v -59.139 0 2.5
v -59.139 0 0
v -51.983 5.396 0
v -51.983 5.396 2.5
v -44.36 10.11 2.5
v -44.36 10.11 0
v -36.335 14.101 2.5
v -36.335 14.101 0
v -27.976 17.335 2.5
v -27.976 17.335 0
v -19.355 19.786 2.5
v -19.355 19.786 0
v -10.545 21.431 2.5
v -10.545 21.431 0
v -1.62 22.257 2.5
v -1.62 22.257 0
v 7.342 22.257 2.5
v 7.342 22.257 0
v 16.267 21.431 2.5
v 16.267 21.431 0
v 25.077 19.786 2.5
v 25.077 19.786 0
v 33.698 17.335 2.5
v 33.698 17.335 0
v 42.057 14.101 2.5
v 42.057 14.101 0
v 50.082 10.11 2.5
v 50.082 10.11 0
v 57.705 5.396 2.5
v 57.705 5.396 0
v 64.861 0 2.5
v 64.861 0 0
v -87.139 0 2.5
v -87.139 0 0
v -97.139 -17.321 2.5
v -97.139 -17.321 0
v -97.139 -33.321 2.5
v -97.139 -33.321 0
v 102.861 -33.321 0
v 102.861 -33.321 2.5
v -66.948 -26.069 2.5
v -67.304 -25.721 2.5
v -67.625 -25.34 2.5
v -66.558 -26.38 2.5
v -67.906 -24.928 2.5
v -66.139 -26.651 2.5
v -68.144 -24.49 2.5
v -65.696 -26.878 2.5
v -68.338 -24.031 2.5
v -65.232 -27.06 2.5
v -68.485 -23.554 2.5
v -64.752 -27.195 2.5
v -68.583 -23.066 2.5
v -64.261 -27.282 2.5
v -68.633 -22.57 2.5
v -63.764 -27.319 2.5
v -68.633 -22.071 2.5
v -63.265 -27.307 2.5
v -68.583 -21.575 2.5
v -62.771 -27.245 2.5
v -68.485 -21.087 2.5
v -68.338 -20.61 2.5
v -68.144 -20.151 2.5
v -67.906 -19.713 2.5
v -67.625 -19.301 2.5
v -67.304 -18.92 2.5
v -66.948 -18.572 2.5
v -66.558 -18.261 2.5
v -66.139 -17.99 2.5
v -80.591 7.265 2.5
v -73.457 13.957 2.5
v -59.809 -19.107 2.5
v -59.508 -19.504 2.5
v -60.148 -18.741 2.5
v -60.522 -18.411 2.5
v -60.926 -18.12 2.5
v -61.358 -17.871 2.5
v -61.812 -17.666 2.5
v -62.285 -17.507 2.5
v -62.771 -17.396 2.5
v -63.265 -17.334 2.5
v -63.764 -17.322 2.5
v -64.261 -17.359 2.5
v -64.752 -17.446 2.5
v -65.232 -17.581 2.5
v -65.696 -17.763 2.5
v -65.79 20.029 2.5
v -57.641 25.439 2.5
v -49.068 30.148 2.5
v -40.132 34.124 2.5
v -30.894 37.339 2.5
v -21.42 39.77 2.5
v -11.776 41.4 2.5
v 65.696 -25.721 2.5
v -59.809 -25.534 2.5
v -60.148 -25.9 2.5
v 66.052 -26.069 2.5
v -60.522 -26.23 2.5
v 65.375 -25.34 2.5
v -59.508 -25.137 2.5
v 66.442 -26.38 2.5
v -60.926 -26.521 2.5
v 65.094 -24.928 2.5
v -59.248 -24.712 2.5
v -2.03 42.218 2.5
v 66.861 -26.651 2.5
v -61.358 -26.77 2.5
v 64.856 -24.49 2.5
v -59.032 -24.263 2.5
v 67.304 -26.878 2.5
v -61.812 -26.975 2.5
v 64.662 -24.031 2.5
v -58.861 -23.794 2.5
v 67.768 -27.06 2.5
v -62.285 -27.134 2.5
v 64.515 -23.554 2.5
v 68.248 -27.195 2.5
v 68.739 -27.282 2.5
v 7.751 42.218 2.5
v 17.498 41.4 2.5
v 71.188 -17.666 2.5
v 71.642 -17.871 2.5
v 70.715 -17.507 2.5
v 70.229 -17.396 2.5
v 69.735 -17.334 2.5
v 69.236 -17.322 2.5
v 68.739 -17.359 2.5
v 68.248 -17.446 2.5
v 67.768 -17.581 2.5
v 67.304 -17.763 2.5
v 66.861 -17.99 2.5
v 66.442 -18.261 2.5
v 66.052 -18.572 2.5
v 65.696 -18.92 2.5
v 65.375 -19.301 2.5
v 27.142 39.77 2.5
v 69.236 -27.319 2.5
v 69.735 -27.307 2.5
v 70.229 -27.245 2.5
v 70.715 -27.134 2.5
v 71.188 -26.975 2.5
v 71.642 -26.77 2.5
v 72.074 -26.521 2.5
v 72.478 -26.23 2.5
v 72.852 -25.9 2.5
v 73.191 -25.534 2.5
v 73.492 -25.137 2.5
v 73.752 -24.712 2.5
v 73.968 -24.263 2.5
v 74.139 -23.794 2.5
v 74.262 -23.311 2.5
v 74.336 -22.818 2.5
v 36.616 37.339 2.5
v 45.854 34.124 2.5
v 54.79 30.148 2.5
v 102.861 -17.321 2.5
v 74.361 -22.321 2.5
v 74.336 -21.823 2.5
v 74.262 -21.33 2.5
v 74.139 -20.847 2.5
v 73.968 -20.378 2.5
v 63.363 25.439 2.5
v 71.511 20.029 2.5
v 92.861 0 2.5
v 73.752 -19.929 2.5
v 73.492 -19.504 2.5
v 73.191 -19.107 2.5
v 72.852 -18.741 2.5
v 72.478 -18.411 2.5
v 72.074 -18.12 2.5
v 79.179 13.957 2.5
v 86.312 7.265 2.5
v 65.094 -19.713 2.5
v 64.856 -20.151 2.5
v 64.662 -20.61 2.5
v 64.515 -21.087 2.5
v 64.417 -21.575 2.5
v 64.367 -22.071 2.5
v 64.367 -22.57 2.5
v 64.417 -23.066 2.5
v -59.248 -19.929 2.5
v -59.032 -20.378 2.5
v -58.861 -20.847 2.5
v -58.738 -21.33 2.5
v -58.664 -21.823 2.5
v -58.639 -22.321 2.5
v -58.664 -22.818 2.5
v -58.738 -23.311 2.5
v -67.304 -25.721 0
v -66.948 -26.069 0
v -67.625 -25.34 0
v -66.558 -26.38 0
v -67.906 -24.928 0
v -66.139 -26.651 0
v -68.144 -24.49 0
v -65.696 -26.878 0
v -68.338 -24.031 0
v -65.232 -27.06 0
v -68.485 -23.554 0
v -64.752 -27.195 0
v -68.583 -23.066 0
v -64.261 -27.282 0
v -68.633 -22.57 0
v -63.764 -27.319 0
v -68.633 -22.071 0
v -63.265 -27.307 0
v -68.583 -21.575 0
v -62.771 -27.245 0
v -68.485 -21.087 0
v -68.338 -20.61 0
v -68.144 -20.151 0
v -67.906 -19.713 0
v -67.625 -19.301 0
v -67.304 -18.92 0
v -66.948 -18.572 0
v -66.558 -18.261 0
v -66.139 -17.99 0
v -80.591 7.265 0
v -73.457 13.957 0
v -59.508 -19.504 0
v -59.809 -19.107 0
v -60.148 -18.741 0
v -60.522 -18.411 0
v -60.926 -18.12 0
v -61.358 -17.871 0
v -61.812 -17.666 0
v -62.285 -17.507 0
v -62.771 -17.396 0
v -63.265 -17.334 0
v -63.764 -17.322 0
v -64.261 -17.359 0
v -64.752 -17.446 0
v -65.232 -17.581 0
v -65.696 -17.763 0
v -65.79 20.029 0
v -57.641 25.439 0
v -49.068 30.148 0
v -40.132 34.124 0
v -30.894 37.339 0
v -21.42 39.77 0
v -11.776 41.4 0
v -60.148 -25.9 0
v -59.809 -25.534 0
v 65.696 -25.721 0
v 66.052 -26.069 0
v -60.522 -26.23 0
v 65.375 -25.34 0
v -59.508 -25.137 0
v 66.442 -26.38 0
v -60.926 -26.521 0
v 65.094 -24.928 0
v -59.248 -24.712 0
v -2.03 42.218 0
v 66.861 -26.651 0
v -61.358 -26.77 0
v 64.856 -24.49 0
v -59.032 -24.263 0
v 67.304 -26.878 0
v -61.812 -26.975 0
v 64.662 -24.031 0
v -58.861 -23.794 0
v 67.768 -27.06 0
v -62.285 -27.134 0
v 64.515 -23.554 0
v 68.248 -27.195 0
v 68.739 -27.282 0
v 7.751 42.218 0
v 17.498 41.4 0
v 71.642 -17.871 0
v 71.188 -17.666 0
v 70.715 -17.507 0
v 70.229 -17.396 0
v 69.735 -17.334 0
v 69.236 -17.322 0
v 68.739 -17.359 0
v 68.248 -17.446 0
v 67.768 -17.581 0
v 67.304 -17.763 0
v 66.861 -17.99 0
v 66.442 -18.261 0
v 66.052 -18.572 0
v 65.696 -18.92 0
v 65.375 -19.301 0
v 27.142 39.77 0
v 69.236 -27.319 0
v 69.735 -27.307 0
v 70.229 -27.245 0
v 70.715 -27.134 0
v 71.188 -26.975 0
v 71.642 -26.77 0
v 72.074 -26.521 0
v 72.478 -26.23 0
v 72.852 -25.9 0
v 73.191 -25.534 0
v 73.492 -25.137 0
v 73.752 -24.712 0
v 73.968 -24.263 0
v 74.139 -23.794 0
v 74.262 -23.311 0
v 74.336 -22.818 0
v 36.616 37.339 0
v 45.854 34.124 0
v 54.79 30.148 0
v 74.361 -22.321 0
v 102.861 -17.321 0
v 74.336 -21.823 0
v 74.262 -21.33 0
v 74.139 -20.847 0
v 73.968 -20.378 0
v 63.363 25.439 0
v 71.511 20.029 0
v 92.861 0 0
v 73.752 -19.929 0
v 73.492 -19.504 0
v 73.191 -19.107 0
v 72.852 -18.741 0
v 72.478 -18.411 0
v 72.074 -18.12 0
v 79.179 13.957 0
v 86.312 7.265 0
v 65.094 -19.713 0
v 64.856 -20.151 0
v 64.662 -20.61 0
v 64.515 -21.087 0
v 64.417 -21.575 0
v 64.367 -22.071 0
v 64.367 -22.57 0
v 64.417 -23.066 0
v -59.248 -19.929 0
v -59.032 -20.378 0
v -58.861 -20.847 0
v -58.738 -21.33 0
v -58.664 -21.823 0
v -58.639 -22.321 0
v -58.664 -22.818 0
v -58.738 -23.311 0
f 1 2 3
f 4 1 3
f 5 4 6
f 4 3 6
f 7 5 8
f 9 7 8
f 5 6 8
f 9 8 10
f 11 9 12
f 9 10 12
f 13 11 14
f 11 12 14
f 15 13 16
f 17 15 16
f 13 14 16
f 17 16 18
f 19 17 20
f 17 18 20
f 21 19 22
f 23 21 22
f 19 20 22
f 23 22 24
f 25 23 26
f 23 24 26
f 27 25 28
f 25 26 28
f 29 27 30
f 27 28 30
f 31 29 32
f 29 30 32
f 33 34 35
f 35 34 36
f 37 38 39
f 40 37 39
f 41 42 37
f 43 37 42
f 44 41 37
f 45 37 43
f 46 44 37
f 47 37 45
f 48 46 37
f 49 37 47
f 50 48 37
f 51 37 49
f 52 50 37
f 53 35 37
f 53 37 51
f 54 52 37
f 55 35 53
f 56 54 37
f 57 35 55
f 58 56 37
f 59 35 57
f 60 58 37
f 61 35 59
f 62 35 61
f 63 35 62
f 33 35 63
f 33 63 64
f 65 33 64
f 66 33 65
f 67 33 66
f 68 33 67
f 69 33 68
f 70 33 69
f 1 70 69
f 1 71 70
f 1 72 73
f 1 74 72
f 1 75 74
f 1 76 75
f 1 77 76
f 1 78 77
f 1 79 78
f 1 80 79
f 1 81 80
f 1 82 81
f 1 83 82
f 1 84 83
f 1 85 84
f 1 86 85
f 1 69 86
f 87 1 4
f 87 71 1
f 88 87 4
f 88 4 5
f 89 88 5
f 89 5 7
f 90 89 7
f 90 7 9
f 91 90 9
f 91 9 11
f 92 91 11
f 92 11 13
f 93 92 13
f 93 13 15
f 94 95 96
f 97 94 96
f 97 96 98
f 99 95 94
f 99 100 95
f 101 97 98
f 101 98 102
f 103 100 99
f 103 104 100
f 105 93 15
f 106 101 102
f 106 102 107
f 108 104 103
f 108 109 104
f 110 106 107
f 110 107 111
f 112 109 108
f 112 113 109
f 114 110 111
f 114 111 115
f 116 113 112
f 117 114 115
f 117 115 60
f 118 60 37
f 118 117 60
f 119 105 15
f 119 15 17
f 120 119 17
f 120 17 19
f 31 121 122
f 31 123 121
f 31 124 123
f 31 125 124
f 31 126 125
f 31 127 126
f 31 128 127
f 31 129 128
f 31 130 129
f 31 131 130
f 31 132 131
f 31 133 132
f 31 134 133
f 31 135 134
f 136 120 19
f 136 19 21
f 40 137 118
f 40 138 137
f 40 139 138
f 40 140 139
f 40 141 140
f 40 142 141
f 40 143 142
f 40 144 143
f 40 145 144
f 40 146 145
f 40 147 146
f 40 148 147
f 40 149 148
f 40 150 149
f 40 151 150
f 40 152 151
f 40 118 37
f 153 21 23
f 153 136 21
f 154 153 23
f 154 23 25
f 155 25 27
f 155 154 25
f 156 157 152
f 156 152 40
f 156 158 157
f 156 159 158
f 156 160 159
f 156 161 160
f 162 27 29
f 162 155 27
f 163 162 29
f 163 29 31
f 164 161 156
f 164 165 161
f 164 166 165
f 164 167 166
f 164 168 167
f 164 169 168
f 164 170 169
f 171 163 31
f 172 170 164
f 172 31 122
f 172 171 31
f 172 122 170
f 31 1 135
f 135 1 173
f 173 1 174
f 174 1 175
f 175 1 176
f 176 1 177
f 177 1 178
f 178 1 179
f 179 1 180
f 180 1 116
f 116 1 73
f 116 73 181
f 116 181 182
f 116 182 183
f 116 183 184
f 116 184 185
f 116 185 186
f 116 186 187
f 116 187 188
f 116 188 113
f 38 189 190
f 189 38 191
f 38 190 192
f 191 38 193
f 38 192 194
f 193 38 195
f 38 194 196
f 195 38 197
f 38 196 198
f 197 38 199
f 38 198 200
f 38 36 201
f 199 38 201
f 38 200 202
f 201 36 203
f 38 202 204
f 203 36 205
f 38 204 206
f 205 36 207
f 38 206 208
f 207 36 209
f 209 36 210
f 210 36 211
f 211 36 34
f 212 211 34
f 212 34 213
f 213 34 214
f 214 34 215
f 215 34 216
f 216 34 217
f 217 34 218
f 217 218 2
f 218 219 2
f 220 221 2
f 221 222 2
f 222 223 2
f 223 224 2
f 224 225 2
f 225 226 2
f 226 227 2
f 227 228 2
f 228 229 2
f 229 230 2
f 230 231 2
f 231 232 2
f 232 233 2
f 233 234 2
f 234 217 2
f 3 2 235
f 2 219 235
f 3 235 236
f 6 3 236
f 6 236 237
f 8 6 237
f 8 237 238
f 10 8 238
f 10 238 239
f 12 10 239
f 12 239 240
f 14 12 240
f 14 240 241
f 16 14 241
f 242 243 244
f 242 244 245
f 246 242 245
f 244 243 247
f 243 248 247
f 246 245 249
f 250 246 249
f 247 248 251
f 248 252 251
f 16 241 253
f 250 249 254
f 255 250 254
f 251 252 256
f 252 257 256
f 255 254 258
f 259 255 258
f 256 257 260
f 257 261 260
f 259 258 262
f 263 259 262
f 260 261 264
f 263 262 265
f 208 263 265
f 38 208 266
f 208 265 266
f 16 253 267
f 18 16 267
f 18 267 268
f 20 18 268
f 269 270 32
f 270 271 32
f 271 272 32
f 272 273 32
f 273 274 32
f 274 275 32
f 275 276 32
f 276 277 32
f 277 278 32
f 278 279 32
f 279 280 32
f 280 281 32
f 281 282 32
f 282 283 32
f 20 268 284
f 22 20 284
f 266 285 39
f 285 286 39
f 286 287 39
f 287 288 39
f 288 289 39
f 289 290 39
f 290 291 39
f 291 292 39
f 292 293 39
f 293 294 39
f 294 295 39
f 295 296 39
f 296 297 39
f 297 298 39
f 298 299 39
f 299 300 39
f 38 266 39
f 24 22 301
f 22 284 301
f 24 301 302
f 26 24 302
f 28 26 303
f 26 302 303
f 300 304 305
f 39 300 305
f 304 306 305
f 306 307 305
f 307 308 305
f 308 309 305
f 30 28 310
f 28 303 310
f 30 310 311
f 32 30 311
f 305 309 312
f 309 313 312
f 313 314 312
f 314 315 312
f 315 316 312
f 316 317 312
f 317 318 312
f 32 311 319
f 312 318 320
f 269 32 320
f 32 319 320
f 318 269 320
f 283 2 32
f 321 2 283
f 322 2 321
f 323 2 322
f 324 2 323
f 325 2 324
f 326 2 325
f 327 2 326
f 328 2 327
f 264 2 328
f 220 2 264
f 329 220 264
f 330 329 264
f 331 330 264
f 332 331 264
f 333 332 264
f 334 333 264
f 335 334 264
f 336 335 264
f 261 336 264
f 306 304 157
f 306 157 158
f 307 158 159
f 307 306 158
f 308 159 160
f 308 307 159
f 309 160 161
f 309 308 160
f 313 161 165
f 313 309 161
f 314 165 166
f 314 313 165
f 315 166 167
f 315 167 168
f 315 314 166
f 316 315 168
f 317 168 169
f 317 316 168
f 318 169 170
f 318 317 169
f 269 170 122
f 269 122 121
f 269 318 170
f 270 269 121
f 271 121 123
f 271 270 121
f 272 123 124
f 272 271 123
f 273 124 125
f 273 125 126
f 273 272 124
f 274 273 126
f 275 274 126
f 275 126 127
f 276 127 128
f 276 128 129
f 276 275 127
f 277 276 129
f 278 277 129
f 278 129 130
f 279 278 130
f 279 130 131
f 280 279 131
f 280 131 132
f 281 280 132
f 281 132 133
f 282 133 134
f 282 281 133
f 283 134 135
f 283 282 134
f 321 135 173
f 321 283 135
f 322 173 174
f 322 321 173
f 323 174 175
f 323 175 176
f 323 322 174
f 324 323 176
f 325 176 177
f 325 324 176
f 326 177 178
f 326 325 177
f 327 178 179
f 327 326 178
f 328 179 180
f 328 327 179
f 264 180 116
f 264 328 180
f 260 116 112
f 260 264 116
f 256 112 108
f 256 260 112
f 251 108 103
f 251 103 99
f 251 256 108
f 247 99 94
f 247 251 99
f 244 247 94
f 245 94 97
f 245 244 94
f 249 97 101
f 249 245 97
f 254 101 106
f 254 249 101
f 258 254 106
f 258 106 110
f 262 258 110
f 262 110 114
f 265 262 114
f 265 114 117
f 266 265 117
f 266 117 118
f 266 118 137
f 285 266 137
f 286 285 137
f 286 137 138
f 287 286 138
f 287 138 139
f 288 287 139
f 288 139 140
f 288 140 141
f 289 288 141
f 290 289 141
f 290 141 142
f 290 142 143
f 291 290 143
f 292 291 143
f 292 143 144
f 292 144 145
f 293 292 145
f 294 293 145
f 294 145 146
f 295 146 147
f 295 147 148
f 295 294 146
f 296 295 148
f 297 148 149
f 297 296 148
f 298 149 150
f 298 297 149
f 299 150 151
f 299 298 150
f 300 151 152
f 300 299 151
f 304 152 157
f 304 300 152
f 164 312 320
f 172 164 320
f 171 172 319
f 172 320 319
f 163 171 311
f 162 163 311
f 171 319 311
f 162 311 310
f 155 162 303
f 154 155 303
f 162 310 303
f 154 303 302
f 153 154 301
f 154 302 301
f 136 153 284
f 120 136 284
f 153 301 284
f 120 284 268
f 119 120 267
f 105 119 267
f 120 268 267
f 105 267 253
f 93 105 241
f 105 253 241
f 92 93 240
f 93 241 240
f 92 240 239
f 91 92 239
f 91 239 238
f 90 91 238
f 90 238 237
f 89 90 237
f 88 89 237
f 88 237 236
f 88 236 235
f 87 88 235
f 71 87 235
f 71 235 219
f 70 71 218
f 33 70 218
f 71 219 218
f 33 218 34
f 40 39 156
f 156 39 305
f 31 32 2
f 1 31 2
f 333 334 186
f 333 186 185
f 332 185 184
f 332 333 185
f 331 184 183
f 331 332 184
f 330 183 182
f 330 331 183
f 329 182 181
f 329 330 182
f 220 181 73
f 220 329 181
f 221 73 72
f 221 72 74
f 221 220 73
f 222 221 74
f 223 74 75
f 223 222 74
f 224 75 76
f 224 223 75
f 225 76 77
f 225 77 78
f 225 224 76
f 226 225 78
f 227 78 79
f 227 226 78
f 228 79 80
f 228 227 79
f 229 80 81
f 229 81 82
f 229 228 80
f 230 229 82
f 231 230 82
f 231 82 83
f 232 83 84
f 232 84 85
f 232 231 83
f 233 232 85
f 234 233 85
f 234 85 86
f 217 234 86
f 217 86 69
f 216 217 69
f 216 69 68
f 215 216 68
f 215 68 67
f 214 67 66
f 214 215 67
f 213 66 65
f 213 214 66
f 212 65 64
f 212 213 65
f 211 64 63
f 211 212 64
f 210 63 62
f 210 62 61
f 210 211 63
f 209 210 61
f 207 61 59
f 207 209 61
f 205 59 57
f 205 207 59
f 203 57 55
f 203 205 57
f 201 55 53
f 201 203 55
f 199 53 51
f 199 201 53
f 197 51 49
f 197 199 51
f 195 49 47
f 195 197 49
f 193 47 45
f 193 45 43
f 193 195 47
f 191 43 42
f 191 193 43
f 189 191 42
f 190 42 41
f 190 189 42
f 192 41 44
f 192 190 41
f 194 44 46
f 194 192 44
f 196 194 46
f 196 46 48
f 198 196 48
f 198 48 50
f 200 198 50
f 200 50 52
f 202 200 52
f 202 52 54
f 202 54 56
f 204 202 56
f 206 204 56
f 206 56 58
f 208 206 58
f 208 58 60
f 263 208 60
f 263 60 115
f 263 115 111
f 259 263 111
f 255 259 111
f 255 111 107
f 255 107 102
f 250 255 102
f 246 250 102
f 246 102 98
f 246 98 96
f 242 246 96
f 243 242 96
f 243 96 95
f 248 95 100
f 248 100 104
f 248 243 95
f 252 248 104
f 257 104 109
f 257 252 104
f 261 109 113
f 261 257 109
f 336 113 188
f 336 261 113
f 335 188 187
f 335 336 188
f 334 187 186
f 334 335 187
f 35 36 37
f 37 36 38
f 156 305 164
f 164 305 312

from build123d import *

# Parameters (mm, degrees)
F0_R     = 5
F1_DEPTH = 2.5


with BuildPart() as f1:
    # F0 (on Top) → F1 (new body)
    with BuildSketch(Plane.XY):
        with BuildLine():
            Line((-97.139122, -17.320508), (-97.139122, -33.320508))
            Line((-97.139122, -33.320508), (-63.639122, -33.320508))
            Line((-63.639122, -33.320508), (69.360878, -33.320508))
            Line((69.360878, -33.320508), (102.860878, -33.320508))
            Line((102.860878, -33.320508), (102.860878, -17.320508))
            Line((102.860878, -17.320508), (92.860878, 0))
            ThreePointArc((92.860878, 0), (2.860878, 42.320195), (-87.139122, 0))
            Line((-87.139122, 0), (-97.139122, -17.320508))
        make_face()
        with Locations((-63.639122, -22.320508)):
            Circle(F0_R, mode=Mode.SUBTRACT)
        with Locations((69.360878, -22.320508)):
            Circle(F0_R, mode=Mode.SUBTRACT)
        with BuildLine():
            ThreePointArc((-59.139122, 0), (2.860878, 22.360343), (64.860878, 0))
            Line((64.860878, 0), (-59.139122, 0))
        make_face(mode=Mode.SUBTRACT)
    extrude(amount=F1_DEPTH)


solid = f1.part
